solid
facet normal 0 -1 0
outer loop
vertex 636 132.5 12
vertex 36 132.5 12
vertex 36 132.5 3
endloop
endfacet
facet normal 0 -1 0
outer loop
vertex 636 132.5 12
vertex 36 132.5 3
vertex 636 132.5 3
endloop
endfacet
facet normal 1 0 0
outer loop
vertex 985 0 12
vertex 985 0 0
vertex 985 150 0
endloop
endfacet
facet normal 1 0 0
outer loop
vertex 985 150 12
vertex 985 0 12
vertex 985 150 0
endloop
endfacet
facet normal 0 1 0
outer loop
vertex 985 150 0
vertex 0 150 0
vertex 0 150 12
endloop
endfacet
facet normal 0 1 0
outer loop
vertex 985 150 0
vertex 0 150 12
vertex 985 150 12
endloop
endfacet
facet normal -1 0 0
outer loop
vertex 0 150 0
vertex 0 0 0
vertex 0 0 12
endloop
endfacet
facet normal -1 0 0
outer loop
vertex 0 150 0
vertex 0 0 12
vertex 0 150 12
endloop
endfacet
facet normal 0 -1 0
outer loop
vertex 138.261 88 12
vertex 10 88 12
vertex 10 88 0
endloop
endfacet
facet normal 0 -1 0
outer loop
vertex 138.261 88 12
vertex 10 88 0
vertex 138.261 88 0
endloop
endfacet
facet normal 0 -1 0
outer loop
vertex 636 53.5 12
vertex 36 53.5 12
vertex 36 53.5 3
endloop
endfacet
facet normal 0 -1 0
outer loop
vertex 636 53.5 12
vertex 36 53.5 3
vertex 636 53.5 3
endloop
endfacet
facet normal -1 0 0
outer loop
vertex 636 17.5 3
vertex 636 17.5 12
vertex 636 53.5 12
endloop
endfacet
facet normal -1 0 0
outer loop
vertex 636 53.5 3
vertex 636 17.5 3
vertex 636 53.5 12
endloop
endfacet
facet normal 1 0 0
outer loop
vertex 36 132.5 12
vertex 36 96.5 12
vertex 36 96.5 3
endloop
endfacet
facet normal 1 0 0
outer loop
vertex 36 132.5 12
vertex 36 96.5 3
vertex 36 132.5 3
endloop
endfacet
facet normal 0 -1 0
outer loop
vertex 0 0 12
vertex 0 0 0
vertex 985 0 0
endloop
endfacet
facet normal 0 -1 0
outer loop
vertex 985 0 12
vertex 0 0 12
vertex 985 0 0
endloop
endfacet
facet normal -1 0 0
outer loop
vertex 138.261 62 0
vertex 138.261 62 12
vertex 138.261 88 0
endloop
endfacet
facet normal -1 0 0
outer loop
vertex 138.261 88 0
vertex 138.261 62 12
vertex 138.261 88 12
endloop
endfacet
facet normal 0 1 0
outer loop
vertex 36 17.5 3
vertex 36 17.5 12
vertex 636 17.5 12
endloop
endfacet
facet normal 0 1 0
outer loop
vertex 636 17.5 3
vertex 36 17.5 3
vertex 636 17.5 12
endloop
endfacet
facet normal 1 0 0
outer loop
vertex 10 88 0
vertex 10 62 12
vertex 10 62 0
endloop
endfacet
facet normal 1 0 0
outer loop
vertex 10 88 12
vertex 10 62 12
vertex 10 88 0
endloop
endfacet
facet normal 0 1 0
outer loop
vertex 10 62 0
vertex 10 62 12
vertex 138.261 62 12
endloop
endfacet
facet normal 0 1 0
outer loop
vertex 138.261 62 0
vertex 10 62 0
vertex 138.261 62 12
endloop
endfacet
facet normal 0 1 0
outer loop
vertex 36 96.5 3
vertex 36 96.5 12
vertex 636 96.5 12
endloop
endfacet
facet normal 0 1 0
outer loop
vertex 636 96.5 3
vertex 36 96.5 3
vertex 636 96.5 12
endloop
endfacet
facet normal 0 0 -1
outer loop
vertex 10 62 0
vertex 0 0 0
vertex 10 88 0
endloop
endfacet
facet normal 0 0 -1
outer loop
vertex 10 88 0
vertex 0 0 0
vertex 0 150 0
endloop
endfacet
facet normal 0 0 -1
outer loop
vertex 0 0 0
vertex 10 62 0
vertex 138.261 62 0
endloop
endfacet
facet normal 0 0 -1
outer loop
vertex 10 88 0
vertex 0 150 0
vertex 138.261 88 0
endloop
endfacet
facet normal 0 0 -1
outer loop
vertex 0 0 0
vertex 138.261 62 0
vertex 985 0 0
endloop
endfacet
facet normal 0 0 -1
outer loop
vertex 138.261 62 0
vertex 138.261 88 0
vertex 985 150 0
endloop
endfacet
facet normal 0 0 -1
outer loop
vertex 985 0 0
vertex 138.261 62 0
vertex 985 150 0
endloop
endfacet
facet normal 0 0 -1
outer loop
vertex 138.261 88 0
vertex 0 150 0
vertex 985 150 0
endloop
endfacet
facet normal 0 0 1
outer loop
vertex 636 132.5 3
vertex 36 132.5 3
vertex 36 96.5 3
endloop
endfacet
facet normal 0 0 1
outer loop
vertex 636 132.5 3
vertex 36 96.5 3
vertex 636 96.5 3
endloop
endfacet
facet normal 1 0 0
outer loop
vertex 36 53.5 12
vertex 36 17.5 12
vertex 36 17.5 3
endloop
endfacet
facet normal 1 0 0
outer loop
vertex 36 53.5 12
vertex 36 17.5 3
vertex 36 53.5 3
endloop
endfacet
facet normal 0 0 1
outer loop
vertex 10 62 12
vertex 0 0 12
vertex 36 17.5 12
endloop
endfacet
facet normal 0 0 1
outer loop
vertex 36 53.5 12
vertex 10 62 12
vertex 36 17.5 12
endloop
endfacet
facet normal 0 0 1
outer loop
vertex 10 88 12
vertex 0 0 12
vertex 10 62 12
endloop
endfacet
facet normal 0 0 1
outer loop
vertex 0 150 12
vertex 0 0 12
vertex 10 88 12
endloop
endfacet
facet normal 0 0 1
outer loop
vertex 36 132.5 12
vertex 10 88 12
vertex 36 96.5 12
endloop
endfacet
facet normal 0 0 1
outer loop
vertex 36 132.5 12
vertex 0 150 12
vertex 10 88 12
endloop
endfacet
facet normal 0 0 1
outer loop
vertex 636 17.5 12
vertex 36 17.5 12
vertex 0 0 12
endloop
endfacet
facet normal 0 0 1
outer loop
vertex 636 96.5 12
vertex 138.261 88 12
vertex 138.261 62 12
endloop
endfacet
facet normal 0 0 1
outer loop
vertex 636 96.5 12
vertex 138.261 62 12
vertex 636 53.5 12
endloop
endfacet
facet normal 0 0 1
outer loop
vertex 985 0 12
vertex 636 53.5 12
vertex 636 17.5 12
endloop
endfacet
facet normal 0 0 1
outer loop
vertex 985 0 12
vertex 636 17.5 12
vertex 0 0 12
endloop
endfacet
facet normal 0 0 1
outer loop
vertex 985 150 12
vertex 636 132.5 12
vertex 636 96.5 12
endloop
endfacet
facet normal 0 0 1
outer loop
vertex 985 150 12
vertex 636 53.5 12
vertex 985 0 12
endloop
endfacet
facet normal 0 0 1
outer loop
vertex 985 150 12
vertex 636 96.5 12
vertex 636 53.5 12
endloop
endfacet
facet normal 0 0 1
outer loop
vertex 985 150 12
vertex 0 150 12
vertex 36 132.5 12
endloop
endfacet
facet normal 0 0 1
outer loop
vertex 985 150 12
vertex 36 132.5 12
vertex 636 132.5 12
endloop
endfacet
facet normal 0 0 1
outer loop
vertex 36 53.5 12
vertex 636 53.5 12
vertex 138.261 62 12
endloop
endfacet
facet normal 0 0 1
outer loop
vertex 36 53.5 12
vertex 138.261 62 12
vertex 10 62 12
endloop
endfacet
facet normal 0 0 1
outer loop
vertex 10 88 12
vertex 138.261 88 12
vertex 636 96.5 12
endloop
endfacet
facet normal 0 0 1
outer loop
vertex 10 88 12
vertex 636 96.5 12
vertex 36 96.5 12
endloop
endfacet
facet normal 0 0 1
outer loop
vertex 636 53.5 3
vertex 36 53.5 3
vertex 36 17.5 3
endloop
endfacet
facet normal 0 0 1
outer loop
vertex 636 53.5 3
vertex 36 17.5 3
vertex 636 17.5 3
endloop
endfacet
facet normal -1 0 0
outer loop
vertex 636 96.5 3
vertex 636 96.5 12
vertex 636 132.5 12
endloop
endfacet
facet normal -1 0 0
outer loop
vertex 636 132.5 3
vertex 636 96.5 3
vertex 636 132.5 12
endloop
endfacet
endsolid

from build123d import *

# Parameters (mm, degrees)
CROQUIS1_W              = 985
CROQUIS1_H              = 150
SALIENTE_EXTRUIR1_DEPTH = 12
CROQUIS2_W              = 600
CROQUIS2_H              = 36
CORTAR_EXTRUIR1_DEPTH   = 9
CROQUIS3_W              = 128.261008082
CROQUIS3_H              = 26
CORTAR_EXTRUIR2_DEPTH   = 13


with BuildPart() as part:
    # Croquis1 → Saliente-Extruir1 (new body)
    with BuildSketch(Plane.XY):
        with Locations((492.5, 75)):
            Rectangle(CROQUIS1_W, CROQUIS1_H)
    extrude(amount=SALIENTE_EXTRUIR1_DEPTH)

    # Croquis2 → Cortar-Extruir1 (cut)
    with BuildSketch(Plane.XY.offset(12)):
        with Locations((336, 114.5)):
            Rectangle(CROQUIS2_W, CROQUIS2_H)
        with Locations((336, 35.5)):
            Rectangle(CROQUIS2_W, CROQUIS2_H)
    extrude(amount=-CORTAR_EXTRUIR1_DEPTH, mode=Mode.SUBTRACT)

    # Croquis3 → Cortar-Extruir2 (cut, through all)
    with BuildSketch(Plane.XY.offset(12)):
        with Locations((74.130504041, 75)):
            Rectangle(CROQUIS3_W, CROQUIS3_H)
    extrude(amount=-CORTAR_EXTRUIR2_DEPTH, mode=Mode.SUBTRACT)


solid = part.part
